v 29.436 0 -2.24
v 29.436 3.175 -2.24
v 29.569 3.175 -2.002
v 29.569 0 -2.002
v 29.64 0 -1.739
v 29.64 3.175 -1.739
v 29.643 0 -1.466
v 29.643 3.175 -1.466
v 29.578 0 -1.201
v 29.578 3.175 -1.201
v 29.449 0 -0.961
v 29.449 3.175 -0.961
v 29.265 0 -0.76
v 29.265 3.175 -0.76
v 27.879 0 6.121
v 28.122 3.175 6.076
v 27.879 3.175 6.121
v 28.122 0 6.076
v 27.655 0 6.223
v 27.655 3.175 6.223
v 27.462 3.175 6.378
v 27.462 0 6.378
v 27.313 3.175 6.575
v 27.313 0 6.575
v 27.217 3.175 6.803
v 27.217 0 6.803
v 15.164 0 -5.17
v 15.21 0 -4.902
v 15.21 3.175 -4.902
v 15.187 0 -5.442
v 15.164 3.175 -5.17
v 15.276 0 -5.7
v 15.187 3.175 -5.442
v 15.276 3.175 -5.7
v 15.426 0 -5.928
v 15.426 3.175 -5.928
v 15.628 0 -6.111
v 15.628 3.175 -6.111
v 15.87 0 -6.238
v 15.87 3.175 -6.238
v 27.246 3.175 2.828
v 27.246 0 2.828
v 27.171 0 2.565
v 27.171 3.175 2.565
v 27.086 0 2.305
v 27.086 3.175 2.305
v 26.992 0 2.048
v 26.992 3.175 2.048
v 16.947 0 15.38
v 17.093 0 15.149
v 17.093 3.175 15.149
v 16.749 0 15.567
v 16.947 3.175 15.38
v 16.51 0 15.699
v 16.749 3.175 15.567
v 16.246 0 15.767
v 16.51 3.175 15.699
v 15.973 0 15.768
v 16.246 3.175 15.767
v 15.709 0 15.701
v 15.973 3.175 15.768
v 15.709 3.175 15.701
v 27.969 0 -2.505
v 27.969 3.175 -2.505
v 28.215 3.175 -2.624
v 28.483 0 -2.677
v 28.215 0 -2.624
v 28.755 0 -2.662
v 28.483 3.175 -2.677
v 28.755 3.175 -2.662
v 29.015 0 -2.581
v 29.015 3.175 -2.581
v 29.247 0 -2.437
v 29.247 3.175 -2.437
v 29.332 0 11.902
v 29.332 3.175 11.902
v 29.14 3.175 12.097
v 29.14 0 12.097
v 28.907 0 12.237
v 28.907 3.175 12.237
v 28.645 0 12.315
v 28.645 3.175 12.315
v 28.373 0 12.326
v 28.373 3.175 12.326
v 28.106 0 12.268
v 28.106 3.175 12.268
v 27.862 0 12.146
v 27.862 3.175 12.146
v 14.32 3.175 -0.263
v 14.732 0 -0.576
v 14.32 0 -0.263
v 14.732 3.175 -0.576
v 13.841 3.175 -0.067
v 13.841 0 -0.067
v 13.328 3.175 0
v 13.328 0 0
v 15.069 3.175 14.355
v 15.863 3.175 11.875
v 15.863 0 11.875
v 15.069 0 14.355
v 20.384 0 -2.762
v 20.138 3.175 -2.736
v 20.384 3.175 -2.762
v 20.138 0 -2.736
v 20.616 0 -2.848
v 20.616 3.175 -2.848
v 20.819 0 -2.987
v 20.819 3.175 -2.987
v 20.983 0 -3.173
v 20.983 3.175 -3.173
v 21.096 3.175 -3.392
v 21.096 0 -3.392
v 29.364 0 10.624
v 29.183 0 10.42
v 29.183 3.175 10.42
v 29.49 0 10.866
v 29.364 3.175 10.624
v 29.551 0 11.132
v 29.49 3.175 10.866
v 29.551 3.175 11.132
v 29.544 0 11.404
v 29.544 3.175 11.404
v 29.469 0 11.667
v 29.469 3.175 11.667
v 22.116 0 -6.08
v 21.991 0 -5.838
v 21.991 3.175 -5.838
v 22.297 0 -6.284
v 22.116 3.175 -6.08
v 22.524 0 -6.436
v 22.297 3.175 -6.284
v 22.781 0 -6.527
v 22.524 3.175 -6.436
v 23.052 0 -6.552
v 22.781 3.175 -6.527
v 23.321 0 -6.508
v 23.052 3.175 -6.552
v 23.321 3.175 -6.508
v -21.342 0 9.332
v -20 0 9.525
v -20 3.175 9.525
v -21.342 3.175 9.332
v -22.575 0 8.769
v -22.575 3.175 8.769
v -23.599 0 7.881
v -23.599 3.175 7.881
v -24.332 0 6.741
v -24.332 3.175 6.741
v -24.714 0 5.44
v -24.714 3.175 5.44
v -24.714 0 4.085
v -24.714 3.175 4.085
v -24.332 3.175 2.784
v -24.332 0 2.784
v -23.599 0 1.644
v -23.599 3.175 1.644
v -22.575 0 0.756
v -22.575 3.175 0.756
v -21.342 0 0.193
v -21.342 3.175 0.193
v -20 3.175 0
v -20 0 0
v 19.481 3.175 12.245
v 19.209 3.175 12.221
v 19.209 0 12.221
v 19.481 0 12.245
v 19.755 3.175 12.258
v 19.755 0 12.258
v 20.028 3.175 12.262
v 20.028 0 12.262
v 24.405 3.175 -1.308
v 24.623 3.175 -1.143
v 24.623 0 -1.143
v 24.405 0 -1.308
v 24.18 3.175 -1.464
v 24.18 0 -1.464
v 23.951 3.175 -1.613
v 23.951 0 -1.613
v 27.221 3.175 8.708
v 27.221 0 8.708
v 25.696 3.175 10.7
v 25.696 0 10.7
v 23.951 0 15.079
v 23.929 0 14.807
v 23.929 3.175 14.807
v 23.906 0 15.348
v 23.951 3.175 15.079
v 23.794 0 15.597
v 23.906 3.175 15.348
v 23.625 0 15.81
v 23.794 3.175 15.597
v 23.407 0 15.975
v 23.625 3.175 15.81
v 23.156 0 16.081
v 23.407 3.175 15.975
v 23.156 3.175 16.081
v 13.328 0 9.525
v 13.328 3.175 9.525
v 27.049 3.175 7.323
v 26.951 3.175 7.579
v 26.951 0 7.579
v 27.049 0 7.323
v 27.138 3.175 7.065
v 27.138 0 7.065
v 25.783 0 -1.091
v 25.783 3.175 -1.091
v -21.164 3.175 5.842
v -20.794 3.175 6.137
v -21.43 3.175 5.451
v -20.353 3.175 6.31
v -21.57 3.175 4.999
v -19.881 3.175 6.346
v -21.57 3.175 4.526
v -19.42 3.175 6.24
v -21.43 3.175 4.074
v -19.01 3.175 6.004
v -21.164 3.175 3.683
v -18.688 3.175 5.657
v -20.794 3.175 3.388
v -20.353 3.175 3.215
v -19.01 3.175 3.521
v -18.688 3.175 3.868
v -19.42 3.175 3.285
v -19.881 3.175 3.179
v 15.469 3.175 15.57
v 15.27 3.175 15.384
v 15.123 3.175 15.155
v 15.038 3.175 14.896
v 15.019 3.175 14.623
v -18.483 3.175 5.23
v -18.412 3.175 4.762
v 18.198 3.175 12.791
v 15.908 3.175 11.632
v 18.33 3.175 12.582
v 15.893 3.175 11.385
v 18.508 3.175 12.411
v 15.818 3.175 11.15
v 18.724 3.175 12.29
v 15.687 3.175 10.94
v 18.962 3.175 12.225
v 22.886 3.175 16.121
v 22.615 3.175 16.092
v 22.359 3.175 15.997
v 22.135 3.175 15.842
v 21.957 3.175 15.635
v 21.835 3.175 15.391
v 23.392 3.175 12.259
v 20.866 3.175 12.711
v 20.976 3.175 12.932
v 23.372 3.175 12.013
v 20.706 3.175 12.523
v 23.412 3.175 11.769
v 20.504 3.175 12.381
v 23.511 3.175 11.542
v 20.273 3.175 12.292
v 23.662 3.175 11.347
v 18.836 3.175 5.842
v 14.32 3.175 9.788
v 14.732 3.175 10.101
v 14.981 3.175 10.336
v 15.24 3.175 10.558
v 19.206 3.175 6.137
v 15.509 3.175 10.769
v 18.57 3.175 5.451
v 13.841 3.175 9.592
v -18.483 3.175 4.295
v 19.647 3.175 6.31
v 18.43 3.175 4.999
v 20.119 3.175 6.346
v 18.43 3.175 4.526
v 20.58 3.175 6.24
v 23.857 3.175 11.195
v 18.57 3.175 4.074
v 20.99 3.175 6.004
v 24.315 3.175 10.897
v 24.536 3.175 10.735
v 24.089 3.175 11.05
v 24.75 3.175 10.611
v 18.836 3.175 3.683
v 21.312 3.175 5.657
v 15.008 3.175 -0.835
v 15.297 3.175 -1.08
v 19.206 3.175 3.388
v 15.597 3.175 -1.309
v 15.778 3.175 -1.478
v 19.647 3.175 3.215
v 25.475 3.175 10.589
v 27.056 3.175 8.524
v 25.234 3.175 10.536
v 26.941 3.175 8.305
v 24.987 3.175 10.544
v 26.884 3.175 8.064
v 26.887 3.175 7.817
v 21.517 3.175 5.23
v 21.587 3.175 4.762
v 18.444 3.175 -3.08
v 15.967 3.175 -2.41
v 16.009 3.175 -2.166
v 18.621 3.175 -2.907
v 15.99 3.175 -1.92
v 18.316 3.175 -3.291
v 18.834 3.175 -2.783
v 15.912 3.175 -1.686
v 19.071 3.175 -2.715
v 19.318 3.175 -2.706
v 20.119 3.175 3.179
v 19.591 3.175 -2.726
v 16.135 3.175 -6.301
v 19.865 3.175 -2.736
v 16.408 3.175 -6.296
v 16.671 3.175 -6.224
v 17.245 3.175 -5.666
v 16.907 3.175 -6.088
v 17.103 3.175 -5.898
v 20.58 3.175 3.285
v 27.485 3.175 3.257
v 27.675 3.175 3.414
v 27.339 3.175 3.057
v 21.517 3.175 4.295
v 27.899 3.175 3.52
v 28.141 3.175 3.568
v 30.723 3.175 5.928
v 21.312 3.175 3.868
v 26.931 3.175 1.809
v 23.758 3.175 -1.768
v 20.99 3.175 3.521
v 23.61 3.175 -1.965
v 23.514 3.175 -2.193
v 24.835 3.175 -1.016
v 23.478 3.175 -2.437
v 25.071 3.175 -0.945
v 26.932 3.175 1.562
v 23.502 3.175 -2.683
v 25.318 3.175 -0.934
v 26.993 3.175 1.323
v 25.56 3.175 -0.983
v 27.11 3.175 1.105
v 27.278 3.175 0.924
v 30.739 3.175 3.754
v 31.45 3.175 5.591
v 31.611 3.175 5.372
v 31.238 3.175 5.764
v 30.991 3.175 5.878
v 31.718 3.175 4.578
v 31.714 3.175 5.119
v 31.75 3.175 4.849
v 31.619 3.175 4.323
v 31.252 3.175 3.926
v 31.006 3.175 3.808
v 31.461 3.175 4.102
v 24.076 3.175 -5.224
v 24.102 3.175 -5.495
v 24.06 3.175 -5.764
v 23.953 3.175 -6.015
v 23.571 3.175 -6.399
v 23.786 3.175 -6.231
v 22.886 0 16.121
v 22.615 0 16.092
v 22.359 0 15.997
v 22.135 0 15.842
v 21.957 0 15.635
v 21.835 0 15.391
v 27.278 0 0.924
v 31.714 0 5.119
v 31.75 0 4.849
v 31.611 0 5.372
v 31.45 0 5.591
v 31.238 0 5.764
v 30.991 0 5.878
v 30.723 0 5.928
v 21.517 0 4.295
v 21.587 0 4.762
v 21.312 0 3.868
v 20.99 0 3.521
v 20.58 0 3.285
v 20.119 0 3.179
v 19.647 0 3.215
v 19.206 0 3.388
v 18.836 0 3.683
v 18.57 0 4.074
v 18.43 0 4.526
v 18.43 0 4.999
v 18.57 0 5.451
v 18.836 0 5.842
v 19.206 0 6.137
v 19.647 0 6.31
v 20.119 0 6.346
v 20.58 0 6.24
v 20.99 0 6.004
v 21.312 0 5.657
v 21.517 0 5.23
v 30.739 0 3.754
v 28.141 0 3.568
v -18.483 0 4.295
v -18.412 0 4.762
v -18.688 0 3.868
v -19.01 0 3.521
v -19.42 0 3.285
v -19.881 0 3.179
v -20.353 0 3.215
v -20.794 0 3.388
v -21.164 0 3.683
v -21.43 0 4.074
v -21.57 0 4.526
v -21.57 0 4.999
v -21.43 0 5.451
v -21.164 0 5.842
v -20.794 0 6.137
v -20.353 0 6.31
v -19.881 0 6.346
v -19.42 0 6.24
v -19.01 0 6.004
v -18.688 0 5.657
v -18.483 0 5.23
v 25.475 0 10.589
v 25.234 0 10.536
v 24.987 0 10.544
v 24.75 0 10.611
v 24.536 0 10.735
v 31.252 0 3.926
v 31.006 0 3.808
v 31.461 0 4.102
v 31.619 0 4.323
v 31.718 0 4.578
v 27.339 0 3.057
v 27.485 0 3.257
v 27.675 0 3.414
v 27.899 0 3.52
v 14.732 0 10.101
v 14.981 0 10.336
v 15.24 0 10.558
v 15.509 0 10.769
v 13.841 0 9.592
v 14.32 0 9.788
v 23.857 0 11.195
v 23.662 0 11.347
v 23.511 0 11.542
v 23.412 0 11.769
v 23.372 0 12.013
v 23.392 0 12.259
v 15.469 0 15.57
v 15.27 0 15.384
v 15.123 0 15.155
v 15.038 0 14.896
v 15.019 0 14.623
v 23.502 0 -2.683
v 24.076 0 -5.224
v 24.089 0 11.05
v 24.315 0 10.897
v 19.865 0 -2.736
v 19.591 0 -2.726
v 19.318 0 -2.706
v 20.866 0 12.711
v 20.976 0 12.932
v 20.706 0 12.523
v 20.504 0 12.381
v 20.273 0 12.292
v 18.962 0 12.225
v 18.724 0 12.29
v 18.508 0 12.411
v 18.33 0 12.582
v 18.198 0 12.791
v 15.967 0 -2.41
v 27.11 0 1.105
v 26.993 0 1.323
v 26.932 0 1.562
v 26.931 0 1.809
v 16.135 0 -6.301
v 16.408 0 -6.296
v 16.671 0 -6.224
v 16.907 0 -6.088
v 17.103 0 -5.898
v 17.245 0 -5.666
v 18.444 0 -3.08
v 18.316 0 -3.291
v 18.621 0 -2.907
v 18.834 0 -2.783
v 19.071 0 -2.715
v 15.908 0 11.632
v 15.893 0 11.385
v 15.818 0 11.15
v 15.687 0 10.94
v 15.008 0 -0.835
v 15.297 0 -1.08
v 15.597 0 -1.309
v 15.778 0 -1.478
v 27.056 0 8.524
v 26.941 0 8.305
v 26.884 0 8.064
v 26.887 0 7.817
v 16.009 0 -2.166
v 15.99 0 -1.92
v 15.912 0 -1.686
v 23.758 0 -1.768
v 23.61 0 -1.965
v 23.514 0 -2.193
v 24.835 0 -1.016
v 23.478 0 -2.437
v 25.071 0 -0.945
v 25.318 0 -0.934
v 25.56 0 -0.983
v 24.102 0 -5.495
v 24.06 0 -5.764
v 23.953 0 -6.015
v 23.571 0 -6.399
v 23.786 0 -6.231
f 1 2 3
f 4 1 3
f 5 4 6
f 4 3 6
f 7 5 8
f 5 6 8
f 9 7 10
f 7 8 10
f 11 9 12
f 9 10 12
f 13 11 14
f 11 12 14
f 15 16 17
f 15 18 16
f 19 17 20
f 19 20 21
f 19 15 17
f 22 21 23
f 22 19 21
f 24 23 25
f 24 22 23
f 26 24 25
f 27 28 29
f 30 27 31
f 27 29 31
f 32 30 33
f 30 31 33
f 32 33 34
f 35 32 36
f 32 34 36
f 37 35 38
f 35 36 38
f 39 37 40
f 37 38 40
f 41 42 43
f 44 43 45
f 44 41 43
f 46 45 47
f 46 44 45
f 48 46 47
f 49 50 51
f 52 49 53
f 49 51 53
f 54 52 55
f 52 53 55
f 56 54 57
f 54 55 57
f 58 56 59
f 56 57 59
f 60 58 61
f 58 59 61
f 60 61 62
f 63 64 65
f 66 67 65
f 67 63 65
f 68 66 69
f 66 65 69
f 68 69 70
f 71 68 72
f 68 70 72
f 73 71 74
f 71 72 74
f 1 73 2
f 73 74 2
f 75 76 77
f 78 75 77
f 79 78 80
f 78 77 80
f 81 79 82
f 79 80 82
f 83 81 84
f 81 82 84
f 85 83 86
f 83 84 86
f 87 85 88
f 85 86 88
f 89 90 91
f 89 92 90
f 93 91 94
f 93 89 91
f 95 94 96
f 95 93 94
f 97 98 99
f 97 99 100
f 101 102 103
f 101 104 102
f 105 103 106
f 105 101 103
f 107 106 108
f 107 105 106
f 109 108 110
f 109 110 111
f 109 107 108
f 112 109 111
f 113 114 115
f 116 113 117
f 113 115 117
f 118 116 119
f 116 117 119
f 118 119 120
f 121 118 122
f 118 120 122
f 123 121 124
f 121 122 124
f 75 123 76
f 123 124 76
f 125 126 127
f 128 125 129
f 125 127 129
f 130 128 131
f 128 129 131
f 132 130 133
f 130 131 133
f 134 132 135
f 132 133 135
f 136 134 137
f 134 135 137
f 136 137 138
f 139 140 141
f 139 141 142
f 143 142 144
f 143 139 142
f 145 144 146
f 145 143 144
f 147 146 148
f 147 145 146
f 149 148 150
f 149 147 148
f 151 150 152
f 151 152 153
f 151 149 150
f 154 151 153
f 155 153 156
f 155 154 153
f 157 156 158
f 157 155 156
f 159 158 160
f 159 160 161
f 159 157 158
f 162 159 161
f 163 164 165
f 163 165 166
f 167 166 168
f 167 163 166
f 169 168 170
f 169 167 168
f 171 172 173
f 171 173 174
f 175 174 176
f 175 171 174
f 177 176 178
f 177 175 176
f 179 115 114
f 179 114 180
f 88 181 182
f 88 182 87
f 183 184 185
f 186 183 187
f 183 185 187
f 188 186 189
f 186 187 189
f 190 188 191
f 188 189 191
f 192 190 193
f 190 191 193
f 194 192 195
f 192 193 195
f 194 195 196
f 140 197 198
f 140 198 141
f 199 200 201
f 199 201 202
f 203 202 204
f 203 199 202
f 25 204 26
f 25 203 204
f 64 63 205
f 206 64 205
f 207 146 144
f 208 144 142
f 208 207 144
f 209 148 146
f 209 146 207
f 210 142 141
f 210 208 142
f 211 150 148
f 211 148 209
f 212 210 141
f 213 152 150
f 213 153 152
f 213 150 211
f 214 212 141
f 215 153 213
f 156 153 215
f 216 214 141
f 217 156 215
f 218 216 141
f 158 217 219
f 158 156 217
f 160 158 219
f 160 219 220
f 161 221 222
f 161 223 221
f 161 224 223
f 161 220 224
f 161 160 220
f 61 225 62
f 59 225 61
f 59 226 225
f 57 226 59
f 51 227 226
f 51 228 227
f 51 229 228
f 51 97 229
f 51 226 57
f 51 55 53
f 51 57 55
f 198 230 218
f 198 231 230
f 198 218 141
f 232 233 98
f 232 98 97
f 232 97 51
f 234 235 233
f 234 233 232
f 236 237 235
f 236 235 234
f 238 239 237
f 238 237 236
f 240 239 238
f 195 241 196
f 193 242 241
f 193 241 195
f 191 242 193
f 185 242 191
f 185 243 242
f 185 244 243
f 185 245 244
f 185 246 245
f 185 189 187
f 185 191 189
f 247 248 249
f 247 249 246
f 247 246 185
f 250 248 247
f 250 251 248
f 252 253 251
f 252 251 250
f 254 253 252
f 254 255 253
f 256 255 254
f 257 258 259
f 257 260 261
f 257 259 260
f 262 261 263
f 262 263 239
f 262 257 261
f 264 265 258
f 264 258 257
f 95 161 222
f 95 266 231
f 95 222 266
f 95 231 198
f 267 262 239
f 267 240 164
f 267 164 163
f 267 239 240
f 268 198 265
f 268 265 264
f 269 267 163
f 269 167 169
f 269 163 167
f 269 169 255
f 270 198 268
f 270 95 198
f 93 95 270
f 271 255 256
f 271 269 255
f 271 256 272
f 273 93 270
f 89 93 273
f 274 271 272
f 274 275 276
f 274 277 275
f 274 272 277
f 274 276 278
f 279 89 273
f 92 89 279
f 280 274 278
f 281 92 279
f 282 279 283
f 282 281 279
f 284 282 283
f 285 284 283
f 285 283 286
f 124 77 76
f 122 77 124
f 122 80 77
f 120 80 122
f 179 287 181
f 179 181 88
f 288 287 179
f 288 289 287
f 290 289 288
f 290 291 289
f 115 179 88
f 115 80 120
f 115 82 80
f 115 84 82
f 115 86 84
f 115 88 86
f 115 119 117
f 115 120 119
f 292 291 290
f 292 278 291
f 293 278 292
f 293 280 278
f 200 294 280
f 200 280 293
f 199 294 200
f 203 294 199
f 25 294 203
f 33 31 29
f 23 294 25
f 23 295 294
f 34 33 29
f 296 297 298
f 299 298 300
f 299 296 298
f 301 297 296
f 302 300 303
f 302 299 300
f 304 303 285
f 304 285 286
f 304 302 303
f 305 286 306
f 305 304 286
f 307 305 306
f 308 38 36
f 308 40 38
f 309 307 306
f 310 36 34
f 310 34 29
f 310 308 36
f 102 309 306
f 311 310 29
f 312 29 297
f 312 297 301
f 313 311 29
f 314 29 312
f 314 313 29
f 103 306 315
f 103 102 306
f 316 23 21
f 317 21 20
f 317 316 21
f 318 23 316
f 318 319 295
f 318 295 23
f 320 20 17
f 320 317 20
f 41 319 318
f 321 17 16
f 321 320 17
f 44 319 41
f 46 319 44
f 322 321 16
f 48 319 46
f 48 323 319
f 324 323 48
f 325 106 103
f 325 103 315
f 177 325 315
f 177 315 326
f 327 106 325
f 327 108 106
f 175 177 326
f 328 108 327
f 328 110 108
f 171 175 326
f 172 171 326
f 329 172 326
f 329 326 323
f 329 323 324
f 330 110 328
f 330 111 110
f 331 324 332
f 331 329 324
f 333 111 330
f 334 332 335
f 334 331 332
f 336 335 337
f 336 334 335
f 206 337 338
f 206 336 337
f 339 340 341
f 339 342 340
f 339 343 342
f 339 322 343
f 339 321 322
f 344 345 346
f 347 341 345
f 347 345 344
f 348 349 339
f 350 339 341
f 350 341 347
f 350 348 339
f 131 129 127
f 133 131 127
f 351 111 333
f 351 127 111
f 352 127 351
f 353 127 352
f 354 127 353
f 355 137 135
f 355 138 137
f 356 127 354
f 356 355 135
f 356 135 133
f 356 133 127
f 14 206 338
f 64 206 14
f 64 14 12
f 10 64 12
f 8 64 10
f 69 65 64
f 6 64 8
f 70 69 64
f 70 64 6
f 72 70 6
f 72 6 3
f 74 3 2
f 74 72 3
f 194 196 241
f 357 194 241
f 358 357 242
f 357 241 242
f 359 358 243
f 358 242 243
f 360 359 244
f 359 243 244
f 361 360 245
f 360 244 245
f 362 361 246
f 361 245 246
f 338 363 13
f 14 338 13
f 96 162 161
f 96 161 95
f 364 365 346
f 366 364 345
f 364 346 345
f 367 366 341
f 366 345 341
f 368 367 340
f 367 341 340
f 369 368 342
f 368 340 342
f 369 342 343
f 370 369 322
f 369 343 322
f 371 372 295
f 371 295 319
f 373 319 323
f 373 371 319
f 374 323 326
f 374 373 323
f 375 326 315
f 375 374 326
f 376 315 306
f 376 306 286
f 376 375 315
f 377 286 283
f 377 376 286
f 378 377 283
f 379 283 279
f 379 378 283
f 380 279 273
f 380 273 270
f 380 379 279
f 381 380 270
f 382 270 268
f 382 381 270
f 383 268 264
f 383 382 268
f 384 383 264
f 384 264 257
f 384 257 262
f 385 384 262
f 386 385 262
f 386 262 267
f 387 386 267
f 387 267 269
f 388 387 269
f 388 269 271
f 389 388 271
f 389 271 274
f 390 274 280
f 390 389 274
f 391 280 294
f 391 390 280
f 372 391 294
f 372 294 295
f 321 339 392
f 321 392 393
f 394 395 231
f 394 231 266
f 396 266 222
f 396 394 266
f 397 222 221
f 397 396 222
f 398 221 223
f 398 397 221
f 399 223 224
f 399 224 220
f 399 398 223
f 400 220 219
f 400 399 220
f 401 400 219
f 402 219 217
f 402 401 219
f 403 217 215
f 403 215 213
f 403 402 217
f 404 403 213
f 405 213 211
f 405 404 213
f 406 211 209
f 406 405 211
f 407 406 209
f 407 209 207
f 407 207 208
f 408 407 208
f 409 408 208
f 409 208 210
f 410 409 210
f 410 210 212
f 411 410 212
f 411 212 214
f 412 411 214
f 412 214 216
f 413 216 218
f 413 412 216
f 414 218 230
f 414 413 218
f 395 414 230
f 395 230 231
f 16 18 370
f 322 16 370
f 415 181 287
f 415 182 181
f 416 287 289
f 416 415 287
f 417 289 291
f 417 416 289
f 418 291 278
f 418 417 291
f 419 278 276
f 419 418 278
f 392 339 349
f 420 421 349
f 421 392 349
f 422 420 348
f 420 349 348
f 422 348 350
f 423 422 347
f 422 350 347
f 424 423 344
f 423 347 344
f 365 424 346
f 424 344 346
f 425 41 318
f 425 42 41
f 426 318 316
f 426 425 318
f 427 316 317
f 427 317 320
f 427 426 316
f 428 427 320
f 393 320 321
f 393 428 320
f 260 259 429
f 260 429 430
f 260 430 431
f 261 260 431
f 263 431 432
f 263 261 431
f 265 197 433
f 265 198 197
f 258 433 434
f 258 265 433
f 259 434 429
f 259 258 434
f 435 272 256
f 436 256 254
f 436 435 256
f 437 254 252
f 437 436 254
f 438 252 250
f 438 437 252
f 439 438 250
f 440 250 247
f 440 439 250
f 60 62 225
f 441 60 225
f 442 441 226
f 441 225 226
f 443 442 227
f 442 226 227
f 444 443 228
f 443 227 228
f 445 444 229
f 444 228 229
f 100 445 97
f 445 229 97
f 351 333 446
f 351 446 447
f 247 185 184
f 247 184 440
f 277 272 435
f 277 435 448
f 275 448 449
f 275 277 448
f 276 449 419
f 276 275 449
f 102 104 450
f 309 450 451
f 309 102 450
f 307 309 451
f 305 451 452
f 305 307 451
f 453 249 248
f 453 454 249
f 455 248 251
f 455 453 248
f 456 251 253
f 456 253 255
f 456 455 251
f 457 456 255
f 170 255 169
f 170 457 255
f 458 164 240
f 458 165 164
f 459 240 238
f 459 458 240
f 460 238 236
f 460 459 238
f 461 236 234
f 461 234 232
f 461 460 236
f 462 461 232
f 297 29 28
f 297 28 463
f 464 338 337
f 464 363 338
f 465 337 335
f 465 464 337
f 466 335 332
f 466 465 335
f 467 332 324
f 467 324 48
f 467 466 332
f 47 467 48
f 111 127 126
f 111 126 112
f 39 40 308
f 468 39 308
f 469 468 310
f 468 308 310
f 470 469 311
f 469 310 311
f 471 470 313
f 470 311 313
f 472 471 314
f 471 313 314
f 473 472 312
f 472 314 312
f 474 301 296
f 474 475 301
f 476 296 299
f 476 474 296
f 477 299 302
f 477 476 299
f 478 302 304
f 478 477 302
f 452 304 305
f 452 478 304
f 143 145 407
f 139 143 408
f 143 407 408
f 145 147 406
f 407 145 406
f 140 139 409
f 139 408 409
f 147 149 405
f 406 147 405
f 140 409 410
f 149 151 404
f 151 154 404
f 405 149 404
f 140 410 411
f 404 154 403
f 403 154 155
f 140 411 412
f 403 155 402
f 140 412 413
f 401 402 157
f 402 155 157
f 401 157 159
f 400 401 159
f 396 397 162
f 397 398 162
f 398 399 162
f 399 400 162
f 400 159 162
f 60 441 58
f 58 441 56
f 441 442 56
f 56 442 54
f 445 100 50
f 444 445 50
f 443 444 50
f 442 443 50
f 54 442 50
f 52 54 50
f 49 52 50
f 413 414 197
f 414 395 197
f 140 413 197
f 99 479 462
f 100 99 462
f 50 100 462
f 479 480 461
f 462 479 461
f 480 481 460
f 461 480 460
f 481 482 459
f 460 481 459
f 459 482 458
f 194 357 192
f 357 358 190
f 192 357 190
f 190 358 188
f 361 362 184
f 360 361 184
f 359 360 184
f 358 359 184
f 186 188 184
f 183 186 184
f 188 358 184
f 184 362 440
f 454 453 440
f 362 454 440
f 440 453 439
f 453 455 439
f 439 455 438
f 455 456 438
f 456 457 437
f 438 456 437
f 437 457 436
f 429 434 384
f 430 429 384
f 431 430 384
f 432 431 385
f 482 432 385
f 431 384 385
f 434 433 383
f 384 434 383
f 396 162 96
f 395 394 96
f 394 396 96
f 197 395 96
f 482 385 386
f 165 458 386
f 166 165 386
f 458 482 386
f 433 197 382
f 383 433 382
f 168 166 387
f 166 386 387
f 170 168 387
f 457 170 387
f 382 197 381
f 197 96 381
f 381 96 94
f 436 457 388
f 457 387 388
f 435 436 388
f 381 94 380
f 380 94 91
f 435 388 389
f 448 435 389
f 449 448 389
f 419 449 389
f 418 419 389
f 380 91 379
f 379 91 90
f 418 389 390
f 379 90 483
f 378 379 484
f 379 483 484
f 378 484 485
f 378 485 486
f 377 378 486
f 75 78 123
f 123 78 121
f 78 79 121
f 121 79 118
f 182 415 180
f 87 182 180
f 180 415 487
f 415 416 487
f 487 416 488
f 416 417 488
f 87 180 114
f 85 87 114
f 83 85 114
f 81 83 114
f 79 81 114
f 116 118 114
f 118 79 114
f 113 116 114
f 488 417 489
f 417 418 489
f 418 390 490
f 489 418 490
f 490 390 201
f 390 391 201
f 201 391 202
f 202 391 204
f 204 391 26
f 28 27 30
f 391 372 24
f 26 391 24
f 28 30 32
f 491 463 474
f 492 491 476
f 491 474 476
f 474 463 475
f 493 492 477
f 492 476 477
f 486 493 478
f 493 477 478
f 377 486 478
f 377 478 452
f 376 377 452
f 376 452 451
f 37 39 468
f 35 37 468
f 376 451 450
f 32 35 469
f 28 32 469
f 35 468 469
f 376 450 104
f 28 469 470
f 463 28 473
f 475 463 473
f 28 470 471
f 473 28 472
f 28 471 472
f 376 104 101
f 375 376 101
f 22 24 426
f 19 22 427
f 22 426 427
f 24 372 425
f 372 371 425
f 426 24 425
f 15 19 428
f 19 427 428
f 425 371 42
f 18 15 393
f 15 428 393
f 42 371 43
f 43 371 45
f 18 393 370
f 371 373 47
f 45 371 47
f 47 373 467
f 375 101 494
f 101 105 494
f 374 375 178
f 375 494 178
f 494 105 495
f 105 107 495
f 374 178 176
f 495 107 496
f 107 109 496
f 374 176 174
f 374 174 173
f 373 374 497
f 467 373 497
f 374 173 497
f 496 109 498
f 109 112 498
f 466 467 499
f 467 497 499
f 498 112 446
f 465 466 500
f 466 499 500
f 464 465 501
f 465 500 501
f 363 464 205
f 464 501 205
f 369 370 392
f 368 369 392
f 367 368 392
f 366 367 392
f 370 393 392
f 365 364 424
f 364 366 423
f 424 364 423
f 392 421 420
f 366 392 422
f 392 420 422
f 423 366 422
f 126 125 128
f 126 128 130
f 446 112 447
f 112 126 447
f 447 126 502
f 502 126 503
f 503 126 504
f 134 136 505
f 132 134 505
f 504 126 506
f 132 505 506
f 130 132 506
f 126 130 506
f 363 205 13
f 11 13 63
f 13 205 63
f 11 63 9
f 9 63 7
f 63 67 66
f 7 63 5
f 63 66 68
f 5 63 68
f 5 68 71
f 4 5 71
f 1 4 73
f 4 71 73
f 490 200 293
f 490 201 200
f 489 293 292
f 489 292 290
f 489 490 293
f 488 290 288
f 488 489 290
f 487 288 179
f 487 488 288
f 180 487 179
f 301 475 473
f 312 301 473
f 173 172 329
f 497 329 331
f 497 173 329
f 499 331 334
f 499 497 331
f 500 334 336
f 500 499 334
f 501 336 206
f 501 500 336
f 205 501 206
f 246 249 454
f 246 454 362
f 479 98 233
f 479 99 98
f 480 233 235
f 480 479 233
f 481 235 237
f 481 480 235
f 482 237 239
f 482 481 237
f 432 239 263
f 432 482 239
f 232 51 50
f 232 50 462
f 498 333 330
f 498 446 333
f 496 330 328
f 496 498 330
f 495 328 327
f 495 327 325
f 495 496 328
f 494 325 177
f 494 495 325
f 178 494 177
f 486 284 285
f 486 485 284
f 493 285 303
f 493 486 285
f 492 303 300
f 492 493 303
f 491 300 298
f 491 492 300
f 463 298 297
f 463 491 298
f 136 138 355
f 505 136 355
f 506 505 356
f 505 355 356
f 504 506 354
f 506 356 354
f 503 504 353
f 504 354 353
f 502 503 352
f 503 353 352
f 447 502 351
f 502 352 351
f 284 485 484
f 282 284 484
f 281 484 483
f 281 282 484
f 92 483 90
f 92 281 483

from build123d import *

# Parameters (mm, degrees)
CROQUIS1_R              = 1.5875
SALIENTE_EXTRUIR1_DEPTH = 3.175
CROQUIS2_R              = 7.5
CROQUIS2_R_2            = 1.5875
SALIENTE_EXTRUIR2_DEPTH = 3.175
SALIENTE_EXTRUIR3_DEPTH = 3.175
CORTAR_EXTRUIR1_DEPTH   = 10
REDONDEO3_R             = 1
MATRIZC2_COUNT          = 7
MATRIZC2_ANGLE          = 222
REDONDEO3_OF_MATRIZC2_R = 1
REDONDEO4_R             = 2


with BuildPart() as part:
    # Croquis1 → Saliente-Extruir1 (new body)
    with BuildSketch(Plane(origin=(0, 0, 0), x_dir=(1, 0, 0), z_dir=(0, 1, 0))):
        with BuildLine():
            Line((-20, 0), (20, 0))
            ThreePointArc((20, 0), (24.7625, -4.7625), (20, -9.525))
            Line((20, -9.525), (-20, -9.525))
            ThreePointArc((-20, -9.525), (-24.7625, -4.7625), (-20, 0))
        make_face()
        with Locations((-20, -4.7625)):
            Circle(CROQUIS1_R, mode=Mode.SUBTRACT)
        with Locations((20, -4.7625)):
            Circle(CROQUIS1_R, mode=Mode.SUBTRACT)
    extrude(amount=SALIENTE_EXTRUIR1_DEPTH)

    # Croquis2 → Saliente-Extruir2 (add)
    with BuildSketch(Plane(origin=(0, 3.175, 0), x_dir=(1, 0, 0), z_dir=(0, 1, 0))):
        with Locations((20, -4.7625)):
            Circle(CROQUIS2_R)
        with Locations((20, -4.7625)):
            Circle(CROQUIS2_R_2, mode=Mode.SUBTRACT)
    extrude(amount=-SALIENTE_EXTRUIR2_DEPTH)

    # Croquis8 → Saliente-Extruir3 (add)
    with BuildSketch(Plane(origin=(0, 3.175, 0), x_dir=(1, 0, 0), z_dir=(0, 1, 0))):
        with BuildLine():
            Line((14.926688775, 5.835802374), (16.184441281, 1.694396442))
            ThreePointArc((16.184441281, 1.694396442), (17.363636492, 2.258866495), (18.622936274, 2.60999588))
            Line((18.622936274, 2.60999588), (16.844139666, 6.555761596))
            ThreePointArc((16.844139666, 6.555761596), (15.869697171, 6.237640842), (14.926688775, 5.835802374))
        make_face()
    saliente_extruir3 = extrude(amount=-SALIENTE_EXTRUIR3_DEPTH)

    # Croquis9 → Cortar-Extruir1 (cut)
    with BuildSketch(Plane(origin=(0, 3.175, 0), x_dir=(1, 0, 0), z_dir=(0, 1, 0))):
        with BuildLine():
            ThreePointArc((16.844139666, 6.555761596), (16.353447772, 6.407332445), (15.869697296, 6.237640889))
            ThreePointArc((15.869697296, 6.237640889), (16.670669085, 6.223682337), (17.245417982, 5.665637219))
            Line((17.245417982, 5.665637219), (16.844139666, 6.555761596))
        make_face()
        with BuildLine():
            ThreePointArc((15.869697296, 6.237640889), (15.393808961, 6.047009892), (14.926688775, 5.835802374))
            Line((14.926688775, 5.835802374), (15.210424872, 4.901543567))
            ThreePointArc((15.210424872, 4.901543567), (15.275853116, 5.699960746), (15.869697296, 6.237640889))
        make_face()
    cortar_extruir1 = extrude(amount=-CORTAR_EXTRUIR1_DEPTH, mode=Mode.SUBTRACT)

    # Redondeo3
    redondeo3_edges = [part.edges().sort_by_distance(p)[0] for p in [
        (18.622936274, 1.5875, -2.60999588),
        (16.184441281, 1.5875, -1.694396442),
    ]]
    fillet(redondeo3_edges, radius=REDONDEO3_R)

    # MatrizC2: Saliente-Extruir3, Cortar-Extruir1 ×7 about axis
    matrizc2_axis = Axis((20, 0, 4.7625), (0, -1, 0))
    for i in range(1, MATRIZC2_COUNT):
        add(saliente_extruir3.rotate(matrizc2_axis, i * MATRIZC2_ANGLE / (MATRIZC2_COUNT - 1)))
        add(cortar_extruir1.rotate(matrizc2_axis, i * MATRIZC2_ANGLE / (MATRIZC2_COUNT - 1)), mode=Mode.SUBTRACT)

    # Redondeo3 of MatrizC2
    redondeo3_of_matrizc2_edges = [part.edges().sort_by_distance(p)[0] for p in [
        (23.337106788, 1.5875, -1.954174645),
        (20.838616598, 1.5875, -2.690467342),
        (26.707327688, 1.5875, 1.406646118),
        (25.155056708, 1.5875, -0.685012307),
        (27.376313351, 1.5875, 6.118966491),
        (27.395406089, 1.5875, 3.514313802),
        (25.074643863, 1.5875, 10.284998498),
        (26.657411119, 1.5875, 8.216320666),
        (20.729268228, 1.5875, 12.226960319),
        (23.238283761, 1.5875, 11.527373856),
        (16.090195144, 1.5875, 11.16276765),
        (18.515005687, 1.5875, 12.114016299),
    ]]
    fillet(redondeo3_of_matrizc2_edges, radius=REDONDEO3_OF_MATRIZC2_R)

    # Redondeo4
    redondeo4_edges = [part.edges().sort_by_distance(p)[0] for p in [
        (14.206158981, 1.5875, 0),
        (14.206158981, 1.5875, 9.525),
    ]]
    fillet(redondeo4_edges, radius=REDONDEO4_R)


solid = part.part
